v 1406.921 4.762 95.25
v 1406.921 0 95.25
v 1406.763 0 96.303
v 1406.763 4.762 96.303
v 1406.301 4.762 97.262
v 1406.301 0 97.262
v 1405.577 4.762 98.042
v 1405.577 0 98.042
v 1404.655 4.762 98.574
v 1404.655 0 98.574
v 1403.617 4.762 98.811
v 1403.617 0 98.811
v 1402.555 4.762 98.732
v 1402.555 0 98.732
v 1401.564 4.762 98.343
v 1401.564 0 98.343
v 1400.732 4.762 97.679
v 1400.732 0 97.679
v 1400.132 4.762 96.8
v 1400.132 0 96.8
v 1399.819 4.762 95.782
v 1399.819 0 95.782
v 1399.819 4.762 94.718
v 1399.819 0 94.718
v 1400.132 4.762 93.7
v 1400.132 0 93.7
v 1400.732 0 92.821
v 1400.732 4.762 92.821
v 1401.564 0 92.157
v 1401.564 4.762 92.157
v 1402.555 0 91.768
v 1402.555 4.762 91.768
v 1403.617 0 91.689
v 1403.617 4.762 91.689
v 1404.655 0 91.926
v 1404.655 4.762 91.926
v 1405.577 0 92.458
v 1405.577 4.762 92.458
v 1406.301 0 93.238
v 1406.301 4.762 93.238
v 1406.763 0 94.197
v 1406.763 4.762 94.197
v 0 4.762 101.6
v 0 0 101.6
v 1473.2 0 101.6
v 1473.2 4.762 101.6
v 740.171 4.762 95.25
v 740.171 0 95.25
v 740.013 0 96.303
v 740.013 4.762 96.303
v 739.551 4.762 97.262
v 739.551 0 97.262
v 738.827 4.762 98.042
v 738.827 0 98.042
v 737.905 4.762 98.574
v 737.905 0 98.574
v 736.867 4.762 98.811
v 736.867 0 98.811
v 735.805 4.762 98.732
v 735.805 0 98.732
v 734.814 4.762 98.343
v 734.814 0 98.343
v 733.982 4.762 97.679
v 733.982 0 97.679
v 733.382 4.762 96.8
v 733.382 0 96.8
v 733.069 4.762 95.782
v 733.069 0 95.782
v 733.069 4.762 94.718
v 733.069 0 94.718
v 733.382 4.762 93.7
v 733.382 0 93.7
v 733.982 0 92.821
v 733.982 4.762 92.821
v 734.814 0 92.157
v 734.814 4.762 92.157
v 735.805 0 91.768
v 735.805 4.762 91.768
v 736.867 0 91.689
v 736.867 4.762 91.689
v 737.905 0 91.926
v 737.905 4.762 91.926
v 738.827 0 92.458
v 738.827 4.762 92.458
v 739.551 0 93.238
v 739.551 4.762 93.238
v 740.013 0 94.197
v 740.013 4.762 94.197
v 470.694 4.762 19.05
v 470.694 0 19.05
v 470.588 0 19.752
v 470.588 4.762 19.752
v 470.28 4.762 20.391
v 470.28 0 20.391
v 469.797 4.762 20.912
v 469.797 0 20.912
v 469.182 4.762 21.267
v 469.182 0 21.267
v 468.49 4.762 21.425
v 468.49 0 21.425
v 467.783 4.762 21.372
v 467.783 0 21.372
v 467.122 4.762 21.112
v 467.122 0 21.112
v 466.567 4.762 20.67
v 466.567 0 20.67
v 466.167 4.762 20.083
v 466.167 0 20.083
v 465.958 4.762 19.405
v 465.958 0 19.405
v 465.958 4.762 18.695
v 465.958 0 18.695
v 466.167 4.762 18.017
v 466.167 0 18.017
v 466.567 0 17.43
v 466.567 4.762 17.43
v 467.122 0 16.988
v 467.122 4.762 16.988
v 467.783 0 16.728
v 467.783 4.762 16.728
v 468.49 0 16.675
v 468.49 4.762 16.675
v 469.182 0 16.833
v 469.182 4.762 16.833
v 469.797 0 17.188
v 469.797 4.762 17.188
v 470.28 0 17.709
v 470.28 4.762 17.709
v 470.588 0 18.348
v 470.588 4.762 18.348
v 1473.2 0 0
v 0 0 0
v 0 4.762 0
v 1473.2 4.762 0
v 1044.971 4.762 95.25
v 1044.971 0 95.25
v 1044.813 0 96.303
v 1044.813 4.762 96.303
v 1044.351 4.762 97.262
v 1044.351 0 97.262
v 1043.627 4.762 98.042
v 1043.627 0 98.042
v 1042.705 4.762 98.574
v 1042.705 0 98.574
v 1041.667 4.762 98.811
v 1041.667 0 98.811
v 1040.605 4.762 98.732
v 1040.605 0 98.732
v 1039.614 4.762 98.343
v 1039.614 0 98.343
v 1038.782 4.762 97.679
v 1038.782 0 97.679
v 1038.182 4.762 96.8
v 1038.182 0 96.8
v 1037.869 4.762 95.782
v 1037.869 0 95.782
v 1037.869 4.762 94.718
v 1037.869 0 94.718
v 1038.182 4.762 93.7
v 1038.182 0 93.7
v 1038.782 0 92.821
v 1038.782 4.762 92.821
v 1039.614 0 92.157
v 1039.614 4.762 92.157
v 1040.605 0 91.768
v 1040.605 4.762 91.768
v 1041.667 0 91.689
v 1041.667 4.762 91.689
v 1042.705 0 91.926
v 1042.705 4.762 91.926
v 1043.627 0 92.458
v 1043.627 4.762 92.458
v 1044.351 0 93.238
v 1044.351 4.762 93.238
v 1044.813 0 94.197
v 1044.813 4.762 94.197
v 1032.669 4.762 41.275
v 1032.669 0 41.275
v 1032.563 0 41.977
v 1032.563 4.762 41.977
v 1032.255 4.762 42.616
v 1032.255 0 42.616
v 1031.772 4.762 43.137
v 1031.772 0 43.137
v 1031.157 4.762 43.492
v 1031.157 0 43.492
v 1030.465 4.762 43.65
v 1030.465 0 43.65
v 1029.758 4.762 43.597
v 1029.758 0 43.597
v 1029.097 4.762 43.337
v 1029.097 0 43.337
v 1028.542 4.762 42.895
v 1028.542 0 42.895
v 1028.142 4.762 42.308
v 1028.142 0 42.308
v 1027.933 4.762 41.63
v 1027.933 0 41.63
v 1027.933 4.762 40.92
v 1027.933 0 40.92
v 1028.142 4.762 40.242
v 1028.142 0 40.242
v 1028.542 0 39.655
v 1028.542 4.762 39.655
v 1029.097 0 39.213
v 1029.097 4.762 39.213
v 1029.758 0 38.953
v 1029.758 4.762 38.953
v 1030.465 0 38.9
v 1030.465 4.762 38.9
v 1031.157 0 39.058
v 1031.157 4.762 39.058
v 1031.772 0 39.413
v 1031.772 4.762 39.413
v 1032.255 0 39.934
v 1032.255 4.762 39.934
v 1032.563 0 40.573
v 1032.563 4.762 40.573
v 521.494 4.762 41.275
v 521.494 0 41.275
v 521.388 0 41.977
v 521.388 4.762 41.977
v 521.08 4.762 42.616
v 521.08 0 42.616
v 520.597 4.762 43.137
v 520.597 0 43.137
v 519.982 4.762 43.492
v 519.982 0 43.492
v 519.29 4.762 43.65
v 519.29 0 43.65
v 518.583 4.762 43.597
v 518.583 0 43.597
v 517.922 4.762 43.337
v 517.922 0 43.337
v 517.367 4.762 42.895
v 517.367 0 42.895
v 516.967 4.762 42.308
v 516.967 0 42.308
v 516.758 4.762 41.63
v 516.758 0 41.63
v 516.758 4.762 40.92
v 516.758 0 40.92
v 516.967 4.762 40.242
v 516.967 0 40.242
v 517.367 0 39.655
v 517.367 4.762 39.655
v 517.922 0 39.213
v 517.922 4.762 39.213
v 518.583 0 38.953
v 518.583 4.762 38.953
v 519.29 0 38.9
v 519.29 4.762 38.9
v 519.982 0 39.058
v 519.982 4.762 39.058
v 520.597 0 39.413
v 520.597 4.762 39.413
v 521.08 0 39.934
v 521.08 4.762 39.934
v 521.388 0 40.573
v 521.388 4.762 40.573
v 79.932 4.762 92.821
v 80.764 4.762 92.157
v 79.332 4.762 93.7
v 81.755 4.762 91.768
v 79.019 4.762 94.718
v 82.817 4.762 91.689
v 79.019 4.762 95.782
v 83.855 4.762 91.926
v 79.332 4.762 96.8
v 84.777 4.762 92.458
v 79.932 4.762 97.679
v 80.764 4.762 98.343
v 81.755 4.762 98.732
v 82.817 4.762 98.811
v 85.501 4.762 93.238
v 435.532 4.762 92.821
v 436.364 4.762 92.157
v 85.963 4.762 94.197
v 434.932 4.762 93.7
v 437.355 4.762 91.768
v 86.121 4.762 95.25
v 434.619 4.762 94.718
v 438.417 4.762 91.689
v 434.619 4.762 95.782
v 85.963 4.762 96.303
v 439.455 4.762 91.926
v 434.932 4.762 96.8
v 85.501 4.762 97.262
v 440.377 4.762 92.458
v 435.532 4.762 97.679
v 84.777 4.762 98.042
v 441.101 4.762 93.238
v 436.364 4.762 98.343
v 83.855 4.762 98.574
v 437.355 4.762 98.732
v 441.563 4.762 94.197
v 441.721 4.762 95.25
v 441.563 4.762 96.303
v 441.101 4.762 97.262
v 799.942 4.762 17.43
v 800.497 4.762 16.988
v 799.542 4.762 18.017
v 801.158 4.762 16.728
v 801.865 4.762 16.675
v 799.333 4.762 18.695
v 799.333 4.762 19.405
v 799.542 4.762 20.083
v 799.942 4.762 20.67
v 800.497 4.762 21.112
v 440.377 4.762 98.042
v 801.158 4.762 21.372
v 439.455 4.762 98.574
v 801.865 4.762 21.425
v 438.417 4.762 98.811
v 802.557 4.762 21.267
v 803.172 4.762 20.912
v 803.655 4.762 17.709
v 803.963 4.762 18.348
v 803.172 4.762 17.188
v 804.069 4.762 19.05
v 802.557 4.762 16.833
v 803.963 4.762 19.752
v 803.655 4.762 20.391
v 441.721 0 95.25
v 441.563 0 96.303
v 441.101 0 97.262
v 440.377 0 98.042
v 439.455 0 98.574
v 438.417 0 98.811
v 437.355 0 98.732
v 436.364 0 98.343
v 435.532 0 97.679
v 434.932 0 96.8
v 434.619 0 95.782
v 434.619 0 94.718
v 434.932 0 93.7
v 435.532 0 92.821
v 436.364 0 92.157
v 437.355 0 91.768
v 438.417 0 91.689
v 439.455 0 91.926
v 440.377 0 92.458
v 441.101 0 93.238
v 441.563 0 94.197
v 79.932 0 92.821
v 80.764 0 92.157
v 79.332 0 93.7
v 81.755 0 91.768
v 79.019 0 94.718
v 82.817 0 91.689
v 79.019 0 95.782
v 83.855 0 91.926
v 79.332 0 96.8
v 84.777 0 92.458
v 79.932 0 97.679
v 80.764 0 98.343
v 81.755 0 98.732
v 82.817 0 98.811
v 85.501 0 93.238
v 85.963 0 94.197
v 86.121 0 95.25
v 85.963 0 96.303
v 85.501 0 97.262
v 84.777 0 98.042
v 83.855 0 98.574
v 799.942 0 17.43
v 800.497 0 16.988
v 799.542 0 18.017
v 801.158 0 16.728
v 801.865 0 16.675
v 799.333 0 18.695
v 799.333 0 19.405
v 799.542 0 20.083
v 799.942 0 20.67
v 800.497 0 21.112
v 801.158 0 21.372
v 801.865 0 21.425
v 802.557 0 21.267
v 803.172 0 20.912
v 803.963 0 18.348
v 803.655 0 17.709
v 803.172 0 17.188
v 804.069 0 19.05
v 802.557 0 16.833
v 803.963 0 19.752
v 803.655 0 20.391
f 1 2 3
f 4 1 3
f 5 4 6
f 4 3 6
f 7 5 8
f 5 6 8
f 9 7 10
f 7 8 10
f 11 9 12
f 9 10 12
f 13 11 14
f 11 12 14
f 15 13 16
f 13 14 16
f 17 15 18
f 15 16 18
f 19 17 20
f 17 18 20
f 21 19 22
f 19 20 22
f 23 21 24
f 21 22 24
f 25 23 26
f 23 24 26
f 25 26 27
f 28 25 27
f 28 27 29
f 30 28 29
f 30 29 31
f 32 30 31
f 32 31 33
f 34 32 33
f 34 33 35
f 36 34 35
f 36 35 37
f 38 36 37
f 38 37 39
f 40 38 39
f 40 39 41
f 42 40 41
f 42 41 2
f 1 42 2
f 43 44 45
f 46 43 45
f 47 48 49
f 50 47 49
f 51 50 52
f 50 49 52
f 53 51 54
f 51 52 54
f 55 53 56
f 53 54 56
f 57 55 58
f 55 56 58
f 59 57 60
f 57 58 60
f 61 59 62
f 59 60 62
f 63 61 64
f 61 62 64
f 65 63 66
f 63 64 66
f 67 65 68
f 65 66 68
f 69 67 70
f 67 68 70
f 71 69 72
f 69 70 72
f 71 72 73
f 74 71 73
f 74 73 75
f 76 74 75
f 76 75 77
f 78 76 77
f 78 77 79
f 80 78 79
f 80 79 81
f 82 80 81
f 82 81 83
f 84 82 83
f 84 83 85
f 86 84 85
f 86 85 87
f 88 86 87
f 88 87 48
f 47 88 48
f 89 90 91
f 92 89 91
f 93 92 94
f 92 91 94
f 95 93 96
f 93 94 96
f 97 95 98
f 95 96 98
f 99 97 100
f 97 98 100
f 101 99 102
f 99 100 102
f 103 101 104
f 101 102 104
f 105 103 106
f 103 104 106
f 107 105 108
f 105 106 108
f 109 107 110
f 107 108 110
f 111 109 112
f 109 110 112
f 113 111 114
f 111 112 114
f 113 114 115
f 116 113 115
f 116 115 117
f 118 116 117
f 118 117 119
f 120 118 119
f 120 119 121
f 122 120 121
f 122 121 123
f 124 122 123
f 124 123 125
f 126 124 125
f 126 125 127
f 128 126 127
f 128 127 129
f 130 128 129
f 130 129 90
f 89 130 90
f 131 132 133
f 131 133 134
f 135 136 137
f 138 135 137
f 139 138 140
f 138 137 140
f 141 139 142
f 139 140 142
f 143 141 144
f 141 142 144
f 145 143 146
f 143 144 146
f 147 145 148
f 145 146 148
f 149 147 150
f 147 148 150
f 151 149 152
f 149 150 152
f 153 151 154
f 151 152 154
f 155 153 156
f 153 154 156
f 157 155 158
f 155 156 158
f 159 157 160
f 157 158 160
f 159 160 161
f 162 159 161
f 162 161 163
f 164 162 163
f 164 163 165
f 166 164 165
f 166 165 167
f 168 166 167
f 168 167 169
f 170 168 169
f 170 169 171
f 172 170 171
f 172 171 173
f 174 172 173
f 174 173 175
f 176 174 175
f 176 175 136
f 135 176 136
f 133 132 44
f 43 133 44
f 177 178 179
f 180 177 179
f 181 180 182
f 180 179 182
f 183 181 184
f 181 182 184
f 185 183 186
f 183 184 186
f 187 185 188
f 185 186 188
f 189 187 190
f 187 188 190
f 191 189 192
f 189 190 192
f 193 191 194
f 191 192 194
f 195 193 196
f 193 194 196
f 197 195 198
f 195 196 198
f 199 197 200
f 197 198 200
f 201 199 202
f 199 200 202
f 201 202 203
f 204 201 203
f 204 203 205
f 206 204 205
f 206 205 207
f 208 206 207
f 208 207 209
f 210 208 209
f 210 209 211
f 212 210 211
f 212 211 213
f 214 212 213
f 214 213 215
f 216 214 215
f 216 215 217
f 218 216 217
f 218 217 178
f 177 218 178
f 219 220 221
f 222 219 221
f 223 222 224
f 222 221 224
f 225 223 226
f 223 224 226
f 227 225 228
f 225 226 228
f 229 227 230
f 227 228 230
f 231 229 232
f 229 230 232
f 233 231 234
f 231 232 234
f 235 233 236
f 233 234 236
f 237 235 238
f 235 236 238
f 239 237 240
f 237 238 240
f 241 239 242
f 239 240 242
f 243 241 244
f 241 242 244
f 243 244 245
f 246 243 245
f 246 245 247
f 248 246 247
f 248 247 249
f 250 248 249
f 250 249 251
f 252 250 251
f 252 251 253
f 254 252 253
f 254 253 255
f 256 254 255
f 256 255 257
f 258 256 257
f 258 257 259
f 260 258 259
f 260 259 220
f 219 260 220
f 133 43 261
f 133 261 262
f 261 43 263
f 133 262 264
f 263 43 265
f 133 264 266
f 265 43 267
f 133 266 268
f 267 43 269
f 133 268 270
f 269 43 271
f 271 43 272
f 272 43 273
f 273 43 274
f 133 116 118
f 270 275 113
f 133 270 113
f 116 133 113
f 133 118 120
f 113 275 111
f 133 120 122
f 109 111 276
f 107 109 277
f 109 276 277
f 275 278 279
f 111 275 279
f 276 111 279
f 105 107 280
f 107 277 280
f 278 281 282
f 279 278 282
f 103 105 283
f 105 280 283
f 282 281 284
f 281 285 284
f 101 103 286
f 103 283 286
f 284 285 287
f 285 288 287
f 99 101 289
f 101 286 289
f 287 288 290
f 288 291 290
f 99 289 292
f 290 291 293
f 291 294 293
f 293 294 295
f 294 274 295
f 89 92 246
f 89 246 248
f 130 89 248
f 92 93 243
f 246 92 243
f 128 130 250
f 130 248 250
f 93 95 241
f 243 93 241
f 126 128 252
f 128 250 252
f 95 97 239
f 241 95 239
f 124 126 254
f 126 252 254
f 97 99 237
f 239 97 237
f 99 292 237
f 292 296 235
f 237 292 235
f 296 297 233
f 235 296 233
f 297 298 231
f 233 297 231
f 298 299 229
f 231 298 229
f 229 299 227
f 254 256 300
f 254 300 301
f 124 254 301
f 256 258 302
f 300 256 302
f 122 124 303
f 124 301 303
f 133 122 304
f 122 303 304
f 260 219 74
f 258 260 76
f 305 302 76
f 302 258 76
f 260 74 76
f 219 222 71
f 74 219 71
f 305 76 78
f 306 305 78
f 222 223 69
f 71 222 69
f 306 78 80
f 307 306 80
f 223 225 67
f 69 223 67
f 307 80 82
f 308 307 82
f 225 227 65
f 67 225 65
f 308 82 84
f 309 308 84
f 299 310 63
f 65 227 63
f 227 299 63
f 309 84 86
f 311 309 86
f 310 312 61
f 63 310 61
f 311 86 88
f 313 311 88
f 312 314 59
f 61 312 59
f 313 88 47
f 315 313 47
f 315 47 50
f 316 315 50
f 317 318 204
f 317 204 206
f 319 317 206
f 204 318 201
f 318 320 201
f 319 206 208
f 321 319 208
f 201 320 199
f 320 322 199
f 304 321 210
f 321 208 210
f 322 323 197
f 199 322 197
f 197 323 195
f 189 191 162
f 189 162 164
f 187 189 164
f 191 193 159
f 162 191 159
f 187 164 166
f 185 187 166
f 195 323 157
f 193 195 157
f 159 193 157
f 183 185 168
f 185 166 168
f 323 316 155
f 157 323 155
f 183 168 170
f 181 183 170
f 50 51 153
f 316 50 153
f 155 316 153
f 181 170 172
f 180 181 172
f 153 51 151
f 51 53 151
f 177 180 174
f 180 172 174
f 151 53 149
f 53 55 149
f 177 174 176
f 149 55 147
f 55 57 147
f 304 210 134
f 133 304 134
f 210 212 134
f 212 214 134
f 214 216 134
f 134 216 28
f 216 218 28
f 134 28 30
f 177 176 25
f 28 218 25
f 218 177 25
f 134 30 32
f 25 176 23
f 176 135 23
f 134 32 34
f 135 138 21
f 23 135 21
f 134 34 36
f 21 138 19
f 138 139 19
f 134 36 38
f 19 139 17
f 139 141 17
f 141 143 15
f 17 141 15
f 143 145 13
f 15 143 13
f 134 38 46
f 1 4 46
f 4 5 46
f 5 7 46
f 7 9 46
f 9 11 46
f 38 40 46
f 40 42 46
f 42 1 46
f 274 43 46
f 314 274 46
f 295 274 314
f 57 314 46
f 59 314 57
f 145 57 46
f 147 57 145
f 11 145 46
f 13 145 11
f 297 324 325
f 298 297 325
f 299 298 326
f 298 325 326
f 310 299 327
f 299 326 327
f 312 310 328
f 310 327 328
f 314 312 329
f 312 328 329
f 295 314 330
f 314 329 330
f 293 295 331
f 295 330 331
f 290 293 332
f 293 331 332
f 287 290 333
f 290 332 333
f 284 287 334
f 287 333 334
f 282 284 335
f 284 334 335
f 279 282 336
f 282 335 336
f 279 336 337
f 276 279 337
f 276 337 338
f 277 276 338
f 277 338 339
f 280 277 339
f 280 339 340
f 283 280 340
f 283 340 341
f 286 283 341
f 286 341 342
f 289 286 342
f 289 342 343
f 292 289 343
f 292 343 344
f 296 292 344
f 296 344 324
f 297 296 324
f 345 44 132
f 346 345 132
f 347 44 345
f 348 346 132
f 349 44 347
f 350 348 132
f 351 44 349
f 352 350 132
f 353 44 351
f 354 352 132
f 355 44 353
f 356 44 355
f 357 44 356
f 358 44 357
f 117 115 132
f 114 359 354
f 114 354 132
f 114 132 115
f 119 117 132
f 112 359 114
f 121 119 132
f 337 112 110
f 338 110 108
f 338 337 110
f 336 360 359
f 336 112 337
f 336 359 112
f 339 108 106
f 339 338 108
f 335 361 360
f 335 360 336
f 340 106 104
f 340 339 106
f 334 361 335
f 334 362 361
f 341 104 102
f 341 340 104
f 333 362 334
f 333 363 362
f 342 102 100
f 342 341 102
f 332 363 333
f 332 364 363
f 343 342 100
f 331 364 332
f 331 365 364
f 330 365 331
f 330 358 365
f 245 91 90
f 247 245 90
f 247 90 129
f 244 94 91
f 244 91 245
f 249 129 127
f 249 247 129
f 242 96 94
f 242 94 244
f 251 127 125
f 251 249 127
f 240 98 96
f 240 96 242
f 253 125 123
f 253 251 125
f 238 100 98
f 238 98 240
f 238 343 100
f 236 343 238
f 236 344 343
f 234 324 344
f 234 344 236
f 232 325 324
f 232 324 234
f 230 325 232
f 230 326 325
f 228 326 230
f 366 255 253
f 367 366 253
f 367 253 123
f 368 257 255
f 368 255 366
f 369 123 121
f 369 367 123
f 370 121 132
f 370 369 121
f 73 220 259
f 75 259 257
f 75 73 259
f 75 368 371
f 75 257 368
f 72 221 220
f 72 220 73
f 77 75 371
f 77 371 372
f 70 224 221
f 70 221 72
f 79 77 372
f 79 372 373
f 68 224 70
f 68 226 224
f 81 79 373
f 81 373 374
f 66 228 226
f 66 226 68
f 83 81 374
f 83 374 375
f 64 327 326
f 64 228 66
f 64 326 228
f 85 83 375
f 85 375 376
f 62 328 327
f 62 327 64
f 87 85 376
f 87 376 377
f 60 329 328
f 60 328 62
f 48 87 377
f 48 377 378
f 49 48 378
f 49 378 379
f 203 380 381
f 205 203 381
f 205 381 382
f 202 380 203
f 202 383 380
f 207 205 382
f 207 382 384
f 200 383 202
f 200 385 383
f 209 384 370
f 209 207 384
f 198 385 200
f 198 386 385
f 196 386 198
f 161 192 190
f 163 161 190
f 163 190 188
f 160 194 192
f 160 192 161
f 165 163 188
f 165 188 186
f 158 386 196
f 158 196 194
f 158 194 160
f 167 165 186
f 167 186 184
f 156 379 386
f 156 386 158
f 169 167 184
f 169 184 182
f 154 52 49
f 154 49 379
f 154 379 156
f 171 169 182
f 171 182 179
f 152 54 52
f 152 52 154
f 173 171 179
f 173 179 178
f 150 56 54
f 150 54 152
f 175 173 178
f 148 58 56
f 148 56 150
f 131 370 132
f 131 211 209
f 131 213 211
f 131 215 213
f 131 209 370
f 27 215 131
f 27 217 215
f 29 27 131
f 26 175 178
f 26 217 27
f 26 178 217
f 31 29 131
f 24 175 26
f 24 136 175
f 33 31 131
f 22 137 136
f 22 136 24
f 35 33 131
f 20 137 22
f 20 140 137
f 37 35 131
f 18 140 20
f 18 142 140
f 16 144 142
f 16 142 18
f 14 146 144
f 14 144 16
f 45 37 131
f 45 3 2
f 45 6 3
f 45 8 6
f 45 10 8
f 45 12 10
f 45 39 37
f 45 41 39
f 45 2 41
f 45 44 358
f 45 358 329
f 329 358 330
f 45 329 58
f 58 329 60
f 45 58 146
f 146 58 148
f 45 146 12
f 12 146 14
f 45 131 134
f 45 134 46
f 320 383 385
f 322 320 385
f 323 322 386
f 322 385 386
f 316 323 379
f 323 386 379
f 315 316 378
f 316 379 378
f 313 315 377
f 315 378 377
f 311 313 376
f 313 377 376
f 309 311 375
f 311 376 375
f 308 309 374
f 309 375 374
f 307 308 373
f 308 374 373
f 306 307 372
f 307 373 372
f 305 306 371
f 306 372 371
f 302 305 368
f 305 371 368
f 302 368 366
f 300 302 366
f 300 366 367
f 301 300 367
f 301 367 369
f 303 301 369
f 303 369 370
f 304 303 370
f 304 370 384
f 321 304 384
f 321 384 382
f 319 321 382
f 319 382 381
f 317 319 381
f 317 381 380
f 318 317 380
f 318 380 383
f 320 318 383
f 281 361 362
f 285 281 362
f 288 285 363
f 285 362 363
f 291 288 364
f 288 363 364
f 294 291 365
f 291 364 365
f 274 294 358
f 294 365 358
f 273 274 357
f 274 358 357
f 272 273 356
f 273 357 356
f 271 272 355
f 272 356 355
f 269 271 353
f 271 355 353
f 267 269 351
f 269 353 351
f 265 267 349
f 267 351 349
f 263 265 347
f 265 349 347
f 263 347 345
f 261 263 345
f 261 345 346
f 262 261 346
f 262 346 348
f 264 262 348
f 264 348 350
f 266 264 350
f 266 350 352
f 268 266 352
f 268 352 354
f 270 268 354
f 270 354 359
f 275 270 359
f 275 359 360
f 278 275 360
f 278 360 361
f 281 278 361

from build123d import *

# Parameters (mm, degrees)
F0_W     = 1473.2
F0_H     = 101.6
F1_DEPTH = 4.7625
F2_R     = 3.57124
F3_DEPTH = 4.7635
F4_R     = 2.38125
F5_DEPTH = 4.7635
F6_R     = 2.38125
F7_DEPTH = 4.7635


with BuildPart() as f1:
    # F0 (on Front) → F1 (new body)
    with BuildSketch(Plane.XZ):
        with Locations((736.6, 50.8)):
            Rectangle(F0_W, F0_H)
    extrude(amount=-F1_DEPTH)

    # F2 (on face) → F3 (cut, through all)
    with BuildSketch(Plane.XZ):
        with Locations((82.55, 95.25)):
            Circle(F2_R)
        with Locations((438.15, 95.25)):
            Circle(F2_R)
        with Locations((736.6, 95.25)):
            Circle(F2_R)
        with Locations((1041.4, 95.25)):
            Circle(F2_R)
        with Locations((1403.35, 95.25)):
            Circle(F2_R)
    extrude(amount=-F3_DEPTH, mode=Mode.SUBTRACT)

    # F4 (on face) → F5 (cut, through all)
    with BuildSketch(Plane.XZ):
        with Locations((519.1125, 41.275)):
            Circle(F4_R)
        with Locations((1030.2875, 41.275)):
            Circle(F4_R)
    extrude(amount=-F5_DEPTH, mode=Mode.SUBTRACT)

    # F6 (on face) → F7 (cut, through all)
    with BuildSketch(Plane.XZ):
        with Locations((468.3125, 19.05)):
            Circle(F6_R)
        with Locations((801.6875, 19.05)):
            Circle(F6_R)
    extrude(amount=-F7_DEPTH, mode=Mode.SUBTRACT)


solid = f1.part
